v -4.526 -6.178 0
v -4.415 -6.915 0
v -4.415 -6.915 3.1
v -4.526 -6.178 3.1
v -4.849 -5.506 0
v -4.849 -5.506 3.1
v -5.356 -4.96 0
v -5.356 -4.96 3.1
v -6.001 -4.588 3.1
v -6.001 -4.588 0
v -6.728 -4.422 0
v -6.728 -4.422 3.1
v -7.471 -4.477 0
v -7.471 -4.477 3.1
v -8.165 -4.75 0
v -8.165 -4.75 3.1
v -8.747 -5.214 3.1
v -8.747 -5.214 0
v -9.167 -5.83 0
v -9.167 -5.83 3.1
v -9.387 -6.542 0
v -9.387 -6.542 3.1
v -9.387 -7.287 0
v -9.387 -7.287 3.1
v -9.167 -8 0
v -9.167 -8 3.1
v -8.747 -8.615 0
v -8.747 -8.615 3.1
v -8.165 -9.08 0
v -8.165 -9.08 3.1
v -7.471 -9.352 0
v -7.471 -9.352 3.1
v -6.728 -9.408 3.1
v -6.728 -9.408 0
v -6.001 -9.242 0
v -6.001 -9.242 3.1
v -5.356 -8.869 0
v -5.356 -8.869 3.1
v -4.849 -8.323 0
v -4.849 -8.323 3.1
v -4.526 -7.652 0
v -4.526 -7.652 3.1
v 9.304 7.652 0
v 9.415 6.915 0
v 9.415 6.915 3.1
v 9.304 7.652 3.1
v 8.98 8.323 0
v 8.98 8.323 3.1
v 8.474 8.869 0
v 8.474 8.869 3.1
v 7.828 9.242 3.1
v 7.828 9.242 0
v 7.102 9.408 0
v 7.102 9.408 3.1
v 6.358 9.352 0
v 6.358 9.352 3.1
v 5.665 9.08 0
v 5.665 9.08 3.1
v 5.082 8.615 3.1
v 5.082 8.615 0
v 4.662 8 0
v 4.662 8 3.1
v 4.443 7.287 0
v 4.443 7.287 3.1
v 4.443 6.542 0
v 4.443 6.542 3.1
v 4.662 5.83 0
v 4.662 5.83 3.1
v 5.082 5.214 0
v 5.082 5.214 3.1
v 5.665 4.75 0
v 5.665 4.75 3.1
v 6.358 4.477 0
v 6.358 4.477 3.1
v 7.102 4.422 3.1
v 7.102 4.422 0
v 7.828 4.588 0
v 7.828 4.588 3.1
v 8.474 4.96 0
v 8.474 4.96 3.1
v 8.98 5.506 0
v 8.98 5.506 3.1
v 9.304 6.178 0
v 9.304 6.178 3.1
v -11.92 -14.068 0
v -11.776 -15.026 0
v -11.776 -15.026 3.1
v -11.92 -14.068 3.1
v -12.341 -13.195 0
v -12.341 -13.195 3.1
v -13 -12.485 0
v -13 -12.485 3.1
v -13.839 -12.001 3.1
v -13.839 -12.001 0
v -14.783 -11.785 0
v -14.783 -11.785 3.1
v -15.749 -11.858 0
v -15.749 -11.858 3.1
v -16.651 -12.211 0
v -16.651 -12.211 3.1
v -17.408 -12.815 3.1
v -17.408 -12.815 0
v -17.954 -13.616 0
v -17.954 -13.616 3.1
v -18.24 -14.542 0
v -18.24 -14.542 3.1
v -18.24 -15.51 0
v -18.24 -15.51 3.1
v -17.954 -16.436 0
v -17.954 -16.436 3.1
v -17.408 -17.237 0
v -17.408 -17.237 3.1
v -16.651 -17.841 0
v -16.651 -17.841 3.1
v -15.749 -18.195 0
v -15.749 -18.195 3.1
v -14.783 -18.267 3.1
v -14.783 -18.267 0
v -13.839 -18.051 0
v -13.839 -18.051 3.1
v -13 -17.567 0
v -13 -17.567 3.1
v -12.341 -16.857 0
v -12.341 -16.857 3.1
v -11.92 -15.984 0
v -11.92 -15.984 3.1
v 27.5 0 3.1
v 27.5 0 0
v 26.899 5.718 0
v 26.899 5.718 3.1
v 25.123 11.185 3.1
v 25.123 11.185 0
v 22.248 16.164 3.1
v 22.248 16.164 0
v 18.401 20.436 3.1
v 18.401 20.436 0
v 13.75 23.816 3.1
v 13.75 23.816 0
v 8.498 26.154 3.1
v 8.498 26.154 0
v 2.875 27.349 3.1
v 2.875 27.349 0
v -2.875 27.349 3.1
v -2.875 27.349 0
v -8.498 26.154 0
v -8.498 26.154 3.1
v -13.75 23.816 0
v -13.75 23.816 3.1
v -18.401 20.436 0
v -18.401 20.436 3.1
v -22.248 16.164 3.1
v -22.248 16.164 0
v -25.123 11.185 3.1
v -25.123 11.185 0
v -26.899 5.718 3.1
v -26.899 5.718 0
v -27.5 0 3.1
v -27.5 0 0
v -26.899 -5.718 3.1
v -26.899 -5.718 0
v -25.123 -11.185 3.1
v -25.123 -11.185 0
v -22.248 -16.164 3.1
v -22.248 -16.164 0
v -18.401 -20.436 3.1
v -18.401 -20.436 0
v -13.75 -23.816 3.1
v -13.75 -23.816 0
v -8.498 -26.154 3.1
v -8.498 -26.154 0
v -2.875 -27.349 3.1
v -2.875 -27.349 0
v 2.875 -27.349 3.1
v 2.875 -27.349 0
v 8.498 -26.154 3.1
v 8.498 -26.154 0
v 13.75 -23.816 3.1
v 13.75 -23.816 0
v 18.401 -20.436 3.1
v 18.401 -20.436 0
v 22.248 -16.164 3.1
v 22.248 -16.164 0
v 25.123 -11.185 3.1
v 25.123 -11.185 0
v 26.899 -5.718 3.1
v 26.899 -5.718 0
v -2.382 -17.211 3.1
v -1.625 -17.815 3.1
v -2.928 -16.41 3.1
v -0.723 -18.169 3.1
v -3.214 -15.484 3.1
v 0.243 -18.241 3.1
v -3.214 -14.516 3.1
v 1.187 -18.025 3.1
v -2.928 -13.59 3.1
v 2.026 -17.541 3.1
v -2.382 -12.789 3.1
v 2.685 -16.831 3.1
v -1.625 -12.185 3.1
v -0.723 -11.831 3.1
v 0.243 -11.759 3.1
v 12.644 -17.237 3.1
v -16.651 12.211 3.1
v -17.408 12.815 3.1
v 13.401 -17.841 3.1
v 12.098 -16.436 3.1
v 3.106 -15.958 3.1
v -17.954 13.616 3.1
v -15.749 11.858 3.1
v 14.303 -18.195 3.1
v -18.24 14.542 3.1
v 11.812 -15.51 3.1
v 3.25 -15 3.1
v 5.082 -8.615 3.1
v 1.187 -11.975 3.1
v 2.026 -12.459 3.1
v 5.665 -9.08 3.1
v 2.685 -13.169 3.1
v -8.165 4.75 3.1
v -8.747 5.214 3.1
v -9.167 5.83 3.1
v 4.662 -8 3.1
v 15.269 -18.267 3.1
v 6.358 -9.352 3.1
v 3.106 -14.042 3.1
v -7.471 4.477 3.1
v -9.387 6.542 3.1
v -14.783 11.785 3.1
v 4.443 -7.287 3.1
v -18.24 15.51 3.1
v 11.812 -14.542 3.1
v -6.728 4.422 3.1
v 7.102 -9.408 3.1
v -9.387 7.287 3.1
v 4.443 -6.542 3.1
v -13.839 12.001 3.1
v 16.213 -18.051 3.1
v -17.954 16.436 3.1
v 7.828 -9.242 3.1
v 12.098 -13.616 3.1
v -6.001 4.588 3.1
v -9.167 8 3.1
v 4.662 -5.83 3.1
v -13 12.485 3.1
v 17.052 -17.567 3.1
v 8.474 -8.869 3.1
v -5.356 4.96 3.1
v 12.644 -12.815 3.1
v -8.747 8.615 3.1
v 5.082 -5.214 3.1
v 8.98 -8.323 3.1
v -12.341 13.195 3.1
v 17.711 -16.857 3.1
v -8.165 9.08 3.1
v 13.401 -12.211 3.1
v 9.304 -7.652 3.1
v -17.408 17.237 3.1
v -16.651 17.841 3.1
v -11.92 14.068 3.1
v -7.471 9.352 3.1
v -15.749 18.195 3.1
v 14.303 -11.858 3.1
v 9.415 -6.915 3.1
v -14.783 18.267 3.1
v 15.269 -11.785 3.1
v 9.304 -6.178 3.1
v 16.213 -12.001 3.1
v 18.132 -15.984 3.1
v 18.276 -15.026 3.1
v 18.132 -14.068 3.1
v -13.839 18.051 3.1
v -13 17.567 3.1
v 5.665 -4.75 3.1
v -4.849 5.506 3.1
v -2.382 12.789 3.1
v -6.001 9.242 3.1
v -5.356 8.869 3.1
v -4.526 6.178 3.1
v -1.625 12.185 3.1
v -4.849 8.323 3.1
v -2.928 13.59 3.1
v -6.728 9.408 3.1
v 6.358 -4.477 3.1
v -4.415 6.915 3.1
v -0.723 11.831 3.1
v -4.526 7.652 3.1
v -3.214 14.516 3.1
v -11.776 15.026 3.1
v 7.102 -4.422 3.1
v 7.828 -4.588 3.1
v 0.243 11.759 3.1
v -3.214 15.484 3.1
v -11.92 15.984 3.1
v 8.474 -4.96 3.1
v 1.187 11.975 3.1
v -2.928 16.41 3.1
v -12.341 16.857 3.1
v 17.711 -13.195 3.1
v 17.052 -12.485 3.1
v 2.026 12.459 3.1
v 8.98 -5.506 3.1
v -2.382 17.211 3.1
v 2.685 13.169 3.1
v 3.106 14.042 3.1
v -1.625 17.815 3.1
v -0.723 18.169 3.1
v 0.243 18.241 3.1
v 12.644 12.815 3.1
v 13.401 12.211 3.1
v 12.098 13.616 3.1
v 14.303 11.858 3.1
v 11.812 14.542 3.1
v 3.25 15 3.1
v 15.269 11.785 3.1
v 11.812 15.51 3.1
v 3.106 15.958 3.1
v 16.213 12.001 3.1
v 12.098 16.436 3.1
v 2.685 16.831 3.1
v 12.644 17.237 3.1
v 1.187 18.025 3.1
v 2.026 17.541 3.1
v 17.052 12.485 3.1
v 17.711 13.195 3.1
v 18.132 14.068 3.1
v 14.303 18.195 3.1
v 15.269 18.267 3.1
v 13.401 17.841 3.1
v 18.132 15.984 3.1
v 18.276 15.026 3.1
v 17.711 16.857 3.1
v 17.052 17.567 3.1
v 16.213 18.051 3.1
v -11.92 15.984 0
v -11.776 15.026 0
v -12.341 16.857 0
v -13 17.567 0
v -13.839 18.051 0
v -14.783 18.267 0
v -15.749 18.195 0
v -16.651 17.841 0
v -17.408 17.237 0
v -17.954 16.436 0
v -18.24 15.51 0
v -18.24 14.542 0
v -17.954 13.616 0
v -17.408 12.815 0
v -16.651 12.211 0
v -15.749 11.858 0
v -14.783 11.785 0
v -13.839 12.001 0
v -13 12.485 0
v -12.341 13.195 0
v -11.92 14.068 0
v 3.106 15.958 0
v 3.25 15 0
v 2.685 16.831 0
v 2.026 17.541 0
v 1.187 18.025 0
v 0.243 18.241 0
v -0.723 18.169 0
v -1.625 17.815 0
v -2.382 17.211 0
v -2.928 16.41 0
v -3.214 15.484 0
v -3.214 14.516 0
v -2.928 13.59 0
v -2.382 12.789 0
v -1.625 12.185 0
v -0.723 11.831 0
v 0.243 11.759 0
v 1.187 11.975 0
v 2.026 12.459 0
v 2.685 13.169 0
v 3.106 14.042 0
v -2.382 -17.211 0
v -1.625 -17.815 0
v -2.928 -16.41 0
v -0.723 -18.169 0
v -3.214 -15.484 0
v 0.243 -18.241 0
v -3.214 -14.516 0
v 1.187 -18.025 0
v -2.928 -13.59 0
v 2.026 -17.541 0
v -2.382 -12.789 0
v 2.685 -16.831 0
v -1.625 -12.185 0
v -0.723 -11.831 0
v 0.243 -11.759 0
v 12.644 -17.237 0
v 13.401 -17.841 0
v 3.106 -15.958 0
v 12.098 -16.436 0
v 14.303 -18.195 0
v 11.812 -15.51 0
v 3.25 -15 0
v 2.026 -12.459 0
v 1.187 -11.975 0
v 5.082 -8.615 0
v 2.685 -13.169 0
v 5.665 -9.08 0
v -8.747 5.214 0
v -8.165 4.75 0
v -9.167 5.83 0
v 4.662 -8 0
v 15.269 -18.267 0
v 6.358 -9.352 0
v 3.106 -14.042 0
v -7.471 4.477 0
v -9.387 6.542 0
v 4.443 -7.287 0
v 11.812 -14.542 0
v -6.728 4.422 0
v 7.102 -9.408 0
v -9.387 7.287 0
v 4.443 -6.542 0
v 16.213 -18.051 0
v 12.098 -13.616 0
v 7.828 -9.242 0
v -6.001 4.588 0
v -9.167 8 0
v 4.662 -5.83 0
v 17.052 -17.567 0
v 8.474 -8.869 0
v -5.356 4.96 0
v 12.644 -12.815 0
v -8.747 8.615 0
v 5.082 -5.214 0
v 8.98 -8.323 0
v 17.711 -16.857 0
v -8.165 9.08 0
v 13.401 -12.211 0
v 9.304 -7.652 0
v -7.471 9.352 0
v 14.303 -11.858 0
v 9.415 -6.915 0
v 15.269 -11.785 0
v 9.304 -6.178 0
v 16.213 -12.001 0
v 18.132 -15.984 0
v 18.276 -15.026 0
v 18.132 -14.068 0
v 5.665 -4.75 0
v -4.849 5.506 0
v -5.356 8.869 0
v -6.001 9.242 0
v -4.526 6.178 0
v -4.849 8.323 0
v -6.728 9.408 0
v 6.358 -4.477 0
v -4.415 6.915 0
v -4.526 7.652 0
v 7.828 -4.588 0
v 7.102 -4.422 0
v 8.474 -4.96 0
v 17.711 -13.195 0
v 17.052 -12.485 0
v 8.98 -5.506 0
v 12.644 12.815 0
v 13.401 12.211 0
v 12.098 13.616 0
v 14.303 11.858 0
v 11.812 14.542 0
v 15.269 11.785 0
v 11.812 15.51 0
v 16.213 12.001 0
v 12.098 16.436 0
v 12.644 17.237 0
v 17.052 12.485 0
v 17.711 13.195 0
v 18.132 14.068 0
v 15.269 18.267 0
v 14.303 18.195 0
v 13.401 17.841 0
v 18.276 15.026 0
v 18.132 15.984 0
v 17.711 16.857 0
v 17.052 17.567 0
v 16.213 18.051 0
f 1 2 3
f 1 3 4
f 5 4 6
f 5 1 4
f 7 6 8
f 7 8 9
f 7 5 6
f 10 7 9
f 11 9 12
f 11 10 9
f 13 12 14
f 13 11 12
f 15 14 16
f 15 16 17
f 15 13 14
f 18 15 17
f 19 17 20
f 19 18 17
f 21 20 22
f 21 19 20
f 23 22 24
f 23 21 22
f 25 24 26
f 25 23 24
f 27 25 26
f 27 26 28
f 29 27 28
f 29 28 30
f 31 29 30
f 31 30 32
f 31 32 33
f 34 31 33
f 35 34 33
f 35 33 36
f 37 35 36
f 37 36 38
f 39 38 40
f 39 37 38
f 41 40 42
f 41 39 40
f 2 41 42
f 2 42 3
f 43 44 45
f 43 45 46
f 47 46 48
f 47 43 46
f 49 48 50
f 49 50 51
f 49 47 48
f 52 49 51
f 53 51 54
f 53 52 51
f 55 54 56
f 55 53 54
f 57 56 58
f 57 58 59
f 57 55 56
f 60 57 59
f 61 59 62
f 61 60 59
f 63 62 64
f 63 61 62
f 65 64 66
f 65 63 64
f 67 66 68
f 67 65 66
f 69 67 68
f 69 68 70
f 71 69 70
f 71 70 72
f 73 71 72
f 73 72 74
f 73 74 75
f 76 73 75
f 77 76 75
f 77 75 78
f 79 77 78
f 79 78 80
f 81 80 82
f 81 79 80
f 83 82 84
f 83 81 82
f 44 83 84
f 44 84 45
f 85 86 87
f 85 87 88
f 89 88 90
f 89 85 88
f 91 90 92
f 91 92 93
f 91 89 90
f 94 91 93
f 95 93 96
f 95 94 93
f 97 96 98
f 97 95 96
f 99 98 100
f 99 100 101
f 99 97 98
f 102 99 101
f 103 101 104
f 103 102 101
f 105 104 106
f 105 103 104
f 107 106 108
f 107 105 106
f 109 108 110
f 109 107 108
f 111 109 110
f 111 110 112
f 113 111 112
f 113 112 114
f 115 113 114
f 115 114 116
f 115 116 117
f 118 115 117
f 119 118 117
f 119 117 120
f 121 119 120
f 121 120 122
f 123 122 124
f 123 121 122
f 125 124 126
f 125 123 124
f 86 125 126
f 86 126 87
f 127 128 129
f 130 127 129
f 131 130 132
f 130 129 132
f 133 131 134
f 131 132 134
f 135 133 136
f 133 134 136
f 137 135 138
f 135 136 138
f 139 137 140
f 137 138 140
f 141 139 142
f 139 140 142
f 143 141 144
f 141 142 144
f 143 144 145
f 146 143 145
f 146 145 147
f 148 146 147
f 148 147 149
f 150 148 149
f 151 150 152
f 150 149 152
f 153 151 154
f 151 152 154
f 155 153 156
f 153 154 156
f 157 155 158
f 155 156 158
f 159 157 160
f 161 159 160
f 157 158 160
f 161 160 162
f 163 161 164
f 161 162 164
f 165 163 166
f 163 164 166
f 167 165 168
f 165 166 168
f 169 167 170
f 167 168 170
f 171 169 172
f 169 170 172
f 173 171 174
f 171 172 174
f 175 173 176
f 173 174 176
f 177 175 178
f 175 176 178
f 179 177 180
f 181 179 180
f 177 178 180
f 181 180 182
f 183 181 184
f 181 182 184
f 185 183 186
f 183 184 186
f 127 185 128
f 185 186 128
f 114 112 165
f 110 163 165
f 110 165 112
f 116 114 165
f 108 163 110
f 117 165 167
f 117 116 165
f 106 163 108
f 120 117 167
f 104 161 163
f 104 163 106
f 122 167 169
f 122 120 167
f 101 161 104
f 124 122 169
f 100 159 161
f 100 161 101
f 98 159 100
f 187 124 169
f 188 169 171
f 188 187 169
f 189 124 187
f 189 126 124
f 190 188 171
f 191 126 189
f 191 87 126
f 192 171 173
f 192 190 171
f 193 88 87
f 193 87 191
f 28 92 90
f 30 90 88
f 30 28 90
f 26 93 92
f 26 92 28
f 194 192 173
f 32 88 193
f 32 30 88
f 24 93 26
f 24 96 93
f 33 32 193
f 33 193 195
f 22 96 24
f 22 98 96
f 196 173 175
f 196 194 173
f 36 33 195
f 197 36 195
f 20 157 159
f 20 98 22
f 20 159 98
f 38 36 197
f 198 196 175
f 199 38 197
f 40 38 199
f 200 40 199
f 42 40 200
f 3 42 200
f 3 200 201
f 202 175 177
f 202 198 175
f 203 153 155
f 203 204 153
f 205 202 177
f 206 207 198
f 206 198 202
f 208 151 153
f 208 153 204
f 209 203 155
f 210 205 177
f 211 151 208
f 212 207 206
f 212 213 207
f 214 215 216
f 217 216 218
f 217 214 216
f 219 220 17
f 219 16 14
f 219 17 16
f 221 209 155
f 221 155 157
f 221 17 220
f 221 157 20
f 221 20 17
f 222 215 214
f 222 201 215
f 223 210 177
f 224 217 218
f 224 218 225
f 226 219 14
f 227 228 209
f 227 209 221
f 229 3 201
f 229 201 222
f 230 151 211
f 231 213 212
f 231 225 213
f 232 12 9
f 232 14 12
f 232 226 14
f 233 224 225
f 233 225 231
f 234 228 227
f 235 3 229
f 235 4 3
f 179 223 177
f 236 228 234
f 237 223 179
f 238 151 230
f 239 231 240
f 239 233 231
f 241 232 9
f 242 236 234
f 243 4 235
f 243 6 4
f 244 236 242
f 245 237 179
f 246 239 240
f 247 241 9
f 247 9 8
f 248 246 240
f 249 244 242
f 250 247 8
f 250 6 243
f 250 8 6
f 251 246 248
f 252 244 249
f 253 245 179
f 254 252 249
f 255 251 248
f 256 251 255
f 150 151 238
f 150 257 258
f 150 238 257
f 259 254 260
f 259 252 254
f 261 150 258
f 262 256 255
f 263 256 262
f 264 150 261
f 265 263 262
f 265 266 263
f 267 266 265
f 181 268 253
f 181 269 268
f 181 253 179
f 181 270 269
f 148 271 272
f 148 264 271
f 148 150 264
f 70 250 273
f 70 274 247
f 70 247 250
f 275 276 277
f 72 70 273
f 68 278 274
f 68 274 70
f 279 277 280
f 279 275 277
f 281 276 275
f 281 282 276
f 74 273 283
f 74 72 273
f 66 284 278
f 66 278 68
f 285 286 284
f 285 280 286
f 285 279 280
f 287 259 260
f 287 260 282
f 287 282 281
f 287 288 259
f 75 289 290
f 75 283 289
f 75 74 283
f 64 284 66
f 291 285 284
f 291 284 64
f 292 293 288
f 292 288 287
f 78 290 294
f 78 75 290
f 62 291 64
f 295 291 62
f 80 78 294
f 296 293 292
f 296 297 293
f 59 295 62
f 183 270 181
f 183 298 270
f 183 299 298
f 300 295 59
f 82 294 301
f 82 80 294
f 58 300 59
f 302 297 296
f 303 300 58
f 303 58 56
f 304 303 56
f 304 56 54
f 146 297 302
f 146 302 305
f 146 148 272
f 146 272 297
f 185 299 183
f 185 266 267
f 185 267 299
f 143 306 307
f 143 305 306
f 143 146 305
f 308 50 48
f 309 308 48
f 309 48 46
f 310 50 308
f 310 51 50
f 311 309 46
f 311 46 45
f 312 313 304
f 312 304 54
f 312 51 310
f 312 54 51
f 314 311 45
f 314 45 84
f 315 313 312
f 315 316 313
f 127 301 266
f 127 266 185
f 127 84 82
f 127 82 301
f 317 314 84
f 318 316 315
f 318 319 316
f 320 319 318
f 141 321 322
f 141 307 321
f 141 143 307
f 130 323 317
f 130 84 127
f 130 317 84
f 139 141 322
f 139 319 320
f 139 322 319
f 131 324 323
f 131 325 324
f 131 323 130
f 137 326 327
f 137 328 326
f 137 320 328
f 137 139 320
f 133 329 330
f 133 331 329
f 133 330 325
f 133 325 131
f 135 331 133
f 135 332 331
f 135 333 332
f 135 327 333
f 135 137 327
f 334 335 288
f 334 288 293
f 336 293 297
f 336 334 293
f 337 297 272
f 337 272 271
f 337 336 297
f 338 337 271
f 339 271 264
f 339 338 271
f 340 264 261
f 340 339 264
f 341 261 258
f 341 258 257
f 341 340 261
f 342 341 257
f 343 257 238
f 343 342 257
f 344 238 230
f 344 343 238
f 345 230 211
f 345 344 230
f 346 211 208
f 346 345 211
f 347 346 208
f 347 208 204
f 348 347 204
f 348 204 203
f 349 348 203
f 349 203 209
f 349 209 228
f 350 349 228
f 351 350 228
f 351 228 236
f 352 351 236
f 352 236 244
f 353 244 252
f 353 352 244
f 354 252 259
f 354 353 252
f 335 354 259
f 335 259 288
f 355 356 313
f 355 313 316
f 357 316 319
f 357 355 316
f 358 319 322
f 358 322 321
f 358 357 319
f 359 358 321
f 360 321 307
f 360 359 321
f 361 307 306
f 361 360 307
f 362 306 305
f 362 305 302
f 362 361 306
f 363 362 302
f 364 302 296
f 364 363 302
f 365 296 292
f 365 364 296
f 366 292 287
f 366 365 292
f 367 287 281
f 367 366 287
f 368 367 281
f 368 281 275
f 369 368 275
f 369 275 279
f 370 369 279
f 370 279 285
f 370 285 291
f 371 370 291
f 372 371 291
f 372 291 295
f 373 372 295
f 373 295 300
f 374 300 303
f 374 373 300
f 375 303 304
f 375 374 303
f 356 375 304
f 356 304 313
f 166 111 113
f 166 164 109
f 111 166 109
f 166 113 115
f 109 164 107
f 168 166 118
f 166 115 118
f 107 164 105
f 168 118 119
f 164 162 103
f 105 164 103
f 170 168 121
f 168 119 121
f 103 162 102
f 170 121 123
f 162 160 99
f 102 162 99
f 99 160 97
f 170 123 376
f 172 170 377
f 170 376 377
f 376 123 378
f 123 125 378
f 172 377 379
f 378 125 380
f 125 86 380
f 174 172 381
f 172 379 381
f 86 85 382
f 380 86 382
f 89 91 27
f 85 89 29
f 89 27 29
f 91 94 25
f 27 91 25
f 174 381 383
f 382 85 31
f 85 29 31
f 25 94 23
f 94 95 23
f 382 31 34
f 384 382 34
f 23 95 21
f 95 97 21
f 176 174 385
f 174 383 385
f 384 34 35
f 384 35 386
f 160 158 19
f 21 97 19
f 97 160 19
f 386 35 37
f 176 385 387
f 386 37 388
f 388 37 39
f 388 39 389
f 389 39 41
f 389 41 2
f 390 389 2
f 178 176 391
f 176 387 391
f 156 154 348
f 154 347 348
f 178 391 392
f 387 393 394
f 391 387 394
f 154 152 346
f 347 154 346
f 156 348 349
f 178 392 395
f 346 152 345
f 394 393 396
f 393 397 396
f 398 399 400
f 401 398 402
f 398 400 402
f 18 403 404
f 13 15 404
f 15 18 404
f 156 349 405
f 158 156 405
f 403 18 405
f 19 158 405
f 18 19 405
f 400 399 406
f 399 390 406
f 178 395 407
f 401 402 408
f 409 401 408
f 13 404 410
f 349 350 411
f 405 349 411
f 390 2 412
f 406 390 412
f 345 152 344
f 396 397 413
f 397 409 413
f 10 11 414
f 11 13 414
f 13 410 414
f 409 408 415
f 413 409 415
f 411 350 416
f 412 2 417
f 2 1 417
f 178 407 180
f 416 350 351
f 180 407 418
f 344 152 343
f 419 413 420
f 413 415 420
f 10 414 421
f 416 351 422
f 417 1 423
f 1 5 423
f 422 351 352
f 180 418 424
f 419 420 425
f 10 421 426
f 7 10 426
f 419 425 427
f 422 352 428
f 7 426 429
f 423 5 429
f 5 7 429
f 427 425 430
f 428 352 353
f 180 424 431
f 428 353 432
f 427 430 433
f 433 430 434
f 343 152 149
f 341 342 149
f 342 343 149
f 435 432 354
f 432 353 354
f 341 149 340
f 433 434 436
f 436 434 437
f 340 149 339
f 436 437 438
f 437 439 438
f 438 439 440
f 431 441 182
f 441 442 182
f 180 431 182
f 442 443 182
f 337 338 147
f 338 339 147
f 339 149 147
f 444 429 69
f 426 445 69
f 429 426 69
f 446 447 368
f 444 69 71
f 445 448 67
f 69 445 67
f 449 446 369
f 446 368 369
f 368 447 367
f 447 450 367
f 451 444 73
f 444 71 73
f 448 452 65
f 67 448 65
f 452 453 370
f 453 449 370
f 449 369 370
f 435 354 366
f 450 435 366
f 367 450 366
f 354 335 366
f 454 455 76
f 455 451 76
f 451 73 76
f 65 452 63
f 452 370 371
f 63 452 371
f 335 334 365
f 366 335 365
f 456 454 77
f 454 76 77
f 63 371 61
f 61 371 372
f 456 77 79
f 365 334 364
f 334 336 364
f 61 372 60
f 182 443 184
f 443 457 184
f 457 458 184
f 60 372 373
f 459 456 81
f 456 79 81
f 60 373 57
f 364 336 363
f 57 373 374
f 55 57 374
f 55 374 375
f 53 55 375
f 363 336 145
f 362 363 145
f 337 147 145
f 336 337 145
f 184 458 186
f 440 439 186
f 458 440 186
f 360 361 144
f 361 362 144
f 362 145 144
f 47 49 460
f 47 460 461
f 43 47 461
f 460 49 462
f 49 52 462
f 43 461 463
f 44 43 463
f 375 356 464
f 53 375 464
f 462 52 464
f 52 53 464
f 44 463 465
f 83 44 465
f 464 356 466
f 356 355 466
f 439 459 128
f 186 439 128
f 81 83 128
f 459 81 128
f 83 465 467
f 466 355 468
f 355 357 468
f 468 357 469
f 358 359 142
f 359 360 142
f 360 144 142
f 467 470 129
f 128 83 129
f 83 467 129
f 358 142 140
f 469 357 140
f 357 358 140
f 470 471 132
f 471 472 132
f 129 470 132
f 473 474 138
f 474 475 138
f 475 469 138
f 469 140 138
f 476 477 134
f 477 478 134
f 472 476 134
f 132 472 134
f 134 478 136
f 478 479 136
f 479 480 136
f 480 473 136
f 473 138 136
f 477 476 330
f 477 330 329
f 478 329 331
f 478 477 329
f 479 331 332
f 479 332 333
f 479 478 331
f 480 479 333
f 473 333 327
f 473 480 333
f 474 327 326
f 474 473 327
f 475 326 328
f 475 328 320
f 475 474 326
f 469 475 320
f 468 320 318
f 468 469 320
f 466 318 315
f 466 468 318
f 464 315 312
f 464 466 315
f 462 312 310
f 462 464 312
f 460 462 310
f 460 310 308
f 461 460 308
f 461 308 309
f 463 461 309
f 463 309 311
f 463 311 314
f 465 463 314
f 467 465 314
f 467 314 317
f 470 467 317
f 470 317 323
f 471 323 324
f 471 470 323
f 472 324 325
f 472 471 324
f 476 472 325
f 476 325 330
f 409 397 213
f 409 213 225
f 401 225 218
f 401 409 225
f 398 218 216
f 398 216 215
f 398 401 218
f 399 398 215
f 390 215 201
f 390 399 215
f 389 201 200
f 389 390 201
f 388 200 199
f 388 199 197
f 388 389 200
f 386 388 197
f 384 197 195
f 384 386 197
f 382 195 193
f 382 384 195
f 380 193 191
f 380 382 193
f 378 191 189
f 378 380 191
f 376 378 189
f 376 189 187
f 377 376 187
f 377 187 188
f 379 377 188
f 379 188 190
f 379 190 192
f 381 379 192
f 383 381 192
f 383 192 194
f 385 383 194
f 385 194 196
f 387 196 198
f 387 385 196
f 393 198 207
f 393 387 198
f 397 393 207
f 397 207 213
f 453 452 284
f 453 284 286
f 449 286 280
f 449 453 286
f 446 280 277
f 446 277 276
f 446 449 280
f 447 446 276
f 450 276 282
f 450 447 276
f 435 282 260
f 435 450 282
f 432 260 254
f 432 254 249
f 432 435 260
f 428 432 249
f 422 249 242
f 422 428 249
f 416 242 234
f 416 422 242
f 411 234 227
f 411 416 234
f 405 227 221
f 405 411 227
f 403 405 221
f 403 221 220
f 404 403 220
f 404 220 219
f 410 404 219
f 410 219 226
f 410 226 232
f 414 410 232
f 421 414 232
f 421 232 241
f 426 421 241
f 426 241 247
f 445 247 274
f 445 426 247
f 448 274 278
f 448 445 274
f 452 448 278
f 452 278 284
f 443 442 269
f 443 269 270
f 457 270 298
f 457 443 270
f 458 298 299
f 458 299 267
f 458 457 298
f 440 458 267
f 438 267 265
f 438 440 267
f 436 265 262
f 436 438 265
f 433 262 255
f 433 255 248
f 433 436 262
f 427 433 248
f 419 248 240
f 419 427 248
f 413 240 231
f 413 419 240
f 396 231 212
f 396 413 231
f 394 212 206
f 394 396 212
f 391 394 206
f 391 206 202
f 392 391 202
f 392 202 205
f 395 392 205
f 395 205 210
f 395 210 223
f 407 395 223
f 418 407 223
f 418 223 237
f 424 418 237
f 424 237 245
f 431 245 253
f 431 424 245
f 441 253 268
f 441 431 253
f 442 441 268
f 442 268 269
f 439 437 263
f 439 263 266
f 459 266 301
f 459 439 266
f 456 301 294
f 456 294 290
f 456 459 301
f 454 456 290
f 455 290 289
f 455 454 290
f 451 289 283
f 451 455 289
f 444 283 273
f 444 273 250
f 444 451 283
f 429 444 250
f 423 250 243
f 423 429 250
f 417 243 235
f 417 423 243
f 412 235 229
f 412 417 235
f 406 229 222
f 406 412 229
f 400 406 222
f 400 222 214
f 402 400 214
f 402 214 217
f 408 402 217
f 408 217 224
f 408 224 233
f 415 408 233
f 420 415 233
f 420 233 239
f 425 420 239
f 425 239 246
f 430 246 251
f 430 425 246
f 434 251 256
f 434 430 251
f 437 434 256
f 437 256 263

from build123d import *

# Parameters (mm, degrees)
SKETCH1_R           = 27.5
SKETCH1_R_2         = 2.5
SKETCH1_R_3         = 3.25
BOSS_EXTRUDE1_DEPTH = 3.1


with BuildPart() as part:
    # Sketch1 → Boss-Extrude1 (new body)
    with BuildSketch(Plane.XY):
        Circle(SKETCH1_R)
        with Locations((-6.914797213, 6.914797213)):
            Circle(SKETCH1_R_2, mode=Mode.SUBTRACT)
        with Locations((6.914797213, 6.914797213)):
            Circle(SKETCH1_R_2, mode=Mode.SUBTRACT)
        with Locations((6.914797213, -6.914797213)):
            Circle(SKETCH1_R_2, mode=Mode.SUBTRACT)
        with Locations((-6.914797213, -6.914797213)):
            Circle(SKETCH1_R_2, mode=Mode.SUBTRACT)
        with Locations((15.0260191, -15.0260191)):
            Circle(SKETCH1_R_3, mode=Mode.SUBTRACT)
        with Locations((-15.0260191, -15.0260191)):
            Circle(SKETCH1_R_3, mode=Mode.SUBTRACT)
        with Locations((-15.0260191, 15.0260191)):
            Circle(SKETCH1_R_3, mode=Mode.SUBTRACT)
        with Locations((15.0260191, 15.0260191)):
            Circle(SKETCH1_R_3, mode=Mode.SUBTRACT)
        with Locations((0, -15)):
            Circle(SKETCH1_R_3, mode=Mode.SUBTRACT)
        with Locations((0, 15)):
            Circle(SKETCH1_R_3, mode=Mode.SUBTRACT)
    extrude(amount=BOSS_EXTRUDE1_DEPTH)


solid = part.part
